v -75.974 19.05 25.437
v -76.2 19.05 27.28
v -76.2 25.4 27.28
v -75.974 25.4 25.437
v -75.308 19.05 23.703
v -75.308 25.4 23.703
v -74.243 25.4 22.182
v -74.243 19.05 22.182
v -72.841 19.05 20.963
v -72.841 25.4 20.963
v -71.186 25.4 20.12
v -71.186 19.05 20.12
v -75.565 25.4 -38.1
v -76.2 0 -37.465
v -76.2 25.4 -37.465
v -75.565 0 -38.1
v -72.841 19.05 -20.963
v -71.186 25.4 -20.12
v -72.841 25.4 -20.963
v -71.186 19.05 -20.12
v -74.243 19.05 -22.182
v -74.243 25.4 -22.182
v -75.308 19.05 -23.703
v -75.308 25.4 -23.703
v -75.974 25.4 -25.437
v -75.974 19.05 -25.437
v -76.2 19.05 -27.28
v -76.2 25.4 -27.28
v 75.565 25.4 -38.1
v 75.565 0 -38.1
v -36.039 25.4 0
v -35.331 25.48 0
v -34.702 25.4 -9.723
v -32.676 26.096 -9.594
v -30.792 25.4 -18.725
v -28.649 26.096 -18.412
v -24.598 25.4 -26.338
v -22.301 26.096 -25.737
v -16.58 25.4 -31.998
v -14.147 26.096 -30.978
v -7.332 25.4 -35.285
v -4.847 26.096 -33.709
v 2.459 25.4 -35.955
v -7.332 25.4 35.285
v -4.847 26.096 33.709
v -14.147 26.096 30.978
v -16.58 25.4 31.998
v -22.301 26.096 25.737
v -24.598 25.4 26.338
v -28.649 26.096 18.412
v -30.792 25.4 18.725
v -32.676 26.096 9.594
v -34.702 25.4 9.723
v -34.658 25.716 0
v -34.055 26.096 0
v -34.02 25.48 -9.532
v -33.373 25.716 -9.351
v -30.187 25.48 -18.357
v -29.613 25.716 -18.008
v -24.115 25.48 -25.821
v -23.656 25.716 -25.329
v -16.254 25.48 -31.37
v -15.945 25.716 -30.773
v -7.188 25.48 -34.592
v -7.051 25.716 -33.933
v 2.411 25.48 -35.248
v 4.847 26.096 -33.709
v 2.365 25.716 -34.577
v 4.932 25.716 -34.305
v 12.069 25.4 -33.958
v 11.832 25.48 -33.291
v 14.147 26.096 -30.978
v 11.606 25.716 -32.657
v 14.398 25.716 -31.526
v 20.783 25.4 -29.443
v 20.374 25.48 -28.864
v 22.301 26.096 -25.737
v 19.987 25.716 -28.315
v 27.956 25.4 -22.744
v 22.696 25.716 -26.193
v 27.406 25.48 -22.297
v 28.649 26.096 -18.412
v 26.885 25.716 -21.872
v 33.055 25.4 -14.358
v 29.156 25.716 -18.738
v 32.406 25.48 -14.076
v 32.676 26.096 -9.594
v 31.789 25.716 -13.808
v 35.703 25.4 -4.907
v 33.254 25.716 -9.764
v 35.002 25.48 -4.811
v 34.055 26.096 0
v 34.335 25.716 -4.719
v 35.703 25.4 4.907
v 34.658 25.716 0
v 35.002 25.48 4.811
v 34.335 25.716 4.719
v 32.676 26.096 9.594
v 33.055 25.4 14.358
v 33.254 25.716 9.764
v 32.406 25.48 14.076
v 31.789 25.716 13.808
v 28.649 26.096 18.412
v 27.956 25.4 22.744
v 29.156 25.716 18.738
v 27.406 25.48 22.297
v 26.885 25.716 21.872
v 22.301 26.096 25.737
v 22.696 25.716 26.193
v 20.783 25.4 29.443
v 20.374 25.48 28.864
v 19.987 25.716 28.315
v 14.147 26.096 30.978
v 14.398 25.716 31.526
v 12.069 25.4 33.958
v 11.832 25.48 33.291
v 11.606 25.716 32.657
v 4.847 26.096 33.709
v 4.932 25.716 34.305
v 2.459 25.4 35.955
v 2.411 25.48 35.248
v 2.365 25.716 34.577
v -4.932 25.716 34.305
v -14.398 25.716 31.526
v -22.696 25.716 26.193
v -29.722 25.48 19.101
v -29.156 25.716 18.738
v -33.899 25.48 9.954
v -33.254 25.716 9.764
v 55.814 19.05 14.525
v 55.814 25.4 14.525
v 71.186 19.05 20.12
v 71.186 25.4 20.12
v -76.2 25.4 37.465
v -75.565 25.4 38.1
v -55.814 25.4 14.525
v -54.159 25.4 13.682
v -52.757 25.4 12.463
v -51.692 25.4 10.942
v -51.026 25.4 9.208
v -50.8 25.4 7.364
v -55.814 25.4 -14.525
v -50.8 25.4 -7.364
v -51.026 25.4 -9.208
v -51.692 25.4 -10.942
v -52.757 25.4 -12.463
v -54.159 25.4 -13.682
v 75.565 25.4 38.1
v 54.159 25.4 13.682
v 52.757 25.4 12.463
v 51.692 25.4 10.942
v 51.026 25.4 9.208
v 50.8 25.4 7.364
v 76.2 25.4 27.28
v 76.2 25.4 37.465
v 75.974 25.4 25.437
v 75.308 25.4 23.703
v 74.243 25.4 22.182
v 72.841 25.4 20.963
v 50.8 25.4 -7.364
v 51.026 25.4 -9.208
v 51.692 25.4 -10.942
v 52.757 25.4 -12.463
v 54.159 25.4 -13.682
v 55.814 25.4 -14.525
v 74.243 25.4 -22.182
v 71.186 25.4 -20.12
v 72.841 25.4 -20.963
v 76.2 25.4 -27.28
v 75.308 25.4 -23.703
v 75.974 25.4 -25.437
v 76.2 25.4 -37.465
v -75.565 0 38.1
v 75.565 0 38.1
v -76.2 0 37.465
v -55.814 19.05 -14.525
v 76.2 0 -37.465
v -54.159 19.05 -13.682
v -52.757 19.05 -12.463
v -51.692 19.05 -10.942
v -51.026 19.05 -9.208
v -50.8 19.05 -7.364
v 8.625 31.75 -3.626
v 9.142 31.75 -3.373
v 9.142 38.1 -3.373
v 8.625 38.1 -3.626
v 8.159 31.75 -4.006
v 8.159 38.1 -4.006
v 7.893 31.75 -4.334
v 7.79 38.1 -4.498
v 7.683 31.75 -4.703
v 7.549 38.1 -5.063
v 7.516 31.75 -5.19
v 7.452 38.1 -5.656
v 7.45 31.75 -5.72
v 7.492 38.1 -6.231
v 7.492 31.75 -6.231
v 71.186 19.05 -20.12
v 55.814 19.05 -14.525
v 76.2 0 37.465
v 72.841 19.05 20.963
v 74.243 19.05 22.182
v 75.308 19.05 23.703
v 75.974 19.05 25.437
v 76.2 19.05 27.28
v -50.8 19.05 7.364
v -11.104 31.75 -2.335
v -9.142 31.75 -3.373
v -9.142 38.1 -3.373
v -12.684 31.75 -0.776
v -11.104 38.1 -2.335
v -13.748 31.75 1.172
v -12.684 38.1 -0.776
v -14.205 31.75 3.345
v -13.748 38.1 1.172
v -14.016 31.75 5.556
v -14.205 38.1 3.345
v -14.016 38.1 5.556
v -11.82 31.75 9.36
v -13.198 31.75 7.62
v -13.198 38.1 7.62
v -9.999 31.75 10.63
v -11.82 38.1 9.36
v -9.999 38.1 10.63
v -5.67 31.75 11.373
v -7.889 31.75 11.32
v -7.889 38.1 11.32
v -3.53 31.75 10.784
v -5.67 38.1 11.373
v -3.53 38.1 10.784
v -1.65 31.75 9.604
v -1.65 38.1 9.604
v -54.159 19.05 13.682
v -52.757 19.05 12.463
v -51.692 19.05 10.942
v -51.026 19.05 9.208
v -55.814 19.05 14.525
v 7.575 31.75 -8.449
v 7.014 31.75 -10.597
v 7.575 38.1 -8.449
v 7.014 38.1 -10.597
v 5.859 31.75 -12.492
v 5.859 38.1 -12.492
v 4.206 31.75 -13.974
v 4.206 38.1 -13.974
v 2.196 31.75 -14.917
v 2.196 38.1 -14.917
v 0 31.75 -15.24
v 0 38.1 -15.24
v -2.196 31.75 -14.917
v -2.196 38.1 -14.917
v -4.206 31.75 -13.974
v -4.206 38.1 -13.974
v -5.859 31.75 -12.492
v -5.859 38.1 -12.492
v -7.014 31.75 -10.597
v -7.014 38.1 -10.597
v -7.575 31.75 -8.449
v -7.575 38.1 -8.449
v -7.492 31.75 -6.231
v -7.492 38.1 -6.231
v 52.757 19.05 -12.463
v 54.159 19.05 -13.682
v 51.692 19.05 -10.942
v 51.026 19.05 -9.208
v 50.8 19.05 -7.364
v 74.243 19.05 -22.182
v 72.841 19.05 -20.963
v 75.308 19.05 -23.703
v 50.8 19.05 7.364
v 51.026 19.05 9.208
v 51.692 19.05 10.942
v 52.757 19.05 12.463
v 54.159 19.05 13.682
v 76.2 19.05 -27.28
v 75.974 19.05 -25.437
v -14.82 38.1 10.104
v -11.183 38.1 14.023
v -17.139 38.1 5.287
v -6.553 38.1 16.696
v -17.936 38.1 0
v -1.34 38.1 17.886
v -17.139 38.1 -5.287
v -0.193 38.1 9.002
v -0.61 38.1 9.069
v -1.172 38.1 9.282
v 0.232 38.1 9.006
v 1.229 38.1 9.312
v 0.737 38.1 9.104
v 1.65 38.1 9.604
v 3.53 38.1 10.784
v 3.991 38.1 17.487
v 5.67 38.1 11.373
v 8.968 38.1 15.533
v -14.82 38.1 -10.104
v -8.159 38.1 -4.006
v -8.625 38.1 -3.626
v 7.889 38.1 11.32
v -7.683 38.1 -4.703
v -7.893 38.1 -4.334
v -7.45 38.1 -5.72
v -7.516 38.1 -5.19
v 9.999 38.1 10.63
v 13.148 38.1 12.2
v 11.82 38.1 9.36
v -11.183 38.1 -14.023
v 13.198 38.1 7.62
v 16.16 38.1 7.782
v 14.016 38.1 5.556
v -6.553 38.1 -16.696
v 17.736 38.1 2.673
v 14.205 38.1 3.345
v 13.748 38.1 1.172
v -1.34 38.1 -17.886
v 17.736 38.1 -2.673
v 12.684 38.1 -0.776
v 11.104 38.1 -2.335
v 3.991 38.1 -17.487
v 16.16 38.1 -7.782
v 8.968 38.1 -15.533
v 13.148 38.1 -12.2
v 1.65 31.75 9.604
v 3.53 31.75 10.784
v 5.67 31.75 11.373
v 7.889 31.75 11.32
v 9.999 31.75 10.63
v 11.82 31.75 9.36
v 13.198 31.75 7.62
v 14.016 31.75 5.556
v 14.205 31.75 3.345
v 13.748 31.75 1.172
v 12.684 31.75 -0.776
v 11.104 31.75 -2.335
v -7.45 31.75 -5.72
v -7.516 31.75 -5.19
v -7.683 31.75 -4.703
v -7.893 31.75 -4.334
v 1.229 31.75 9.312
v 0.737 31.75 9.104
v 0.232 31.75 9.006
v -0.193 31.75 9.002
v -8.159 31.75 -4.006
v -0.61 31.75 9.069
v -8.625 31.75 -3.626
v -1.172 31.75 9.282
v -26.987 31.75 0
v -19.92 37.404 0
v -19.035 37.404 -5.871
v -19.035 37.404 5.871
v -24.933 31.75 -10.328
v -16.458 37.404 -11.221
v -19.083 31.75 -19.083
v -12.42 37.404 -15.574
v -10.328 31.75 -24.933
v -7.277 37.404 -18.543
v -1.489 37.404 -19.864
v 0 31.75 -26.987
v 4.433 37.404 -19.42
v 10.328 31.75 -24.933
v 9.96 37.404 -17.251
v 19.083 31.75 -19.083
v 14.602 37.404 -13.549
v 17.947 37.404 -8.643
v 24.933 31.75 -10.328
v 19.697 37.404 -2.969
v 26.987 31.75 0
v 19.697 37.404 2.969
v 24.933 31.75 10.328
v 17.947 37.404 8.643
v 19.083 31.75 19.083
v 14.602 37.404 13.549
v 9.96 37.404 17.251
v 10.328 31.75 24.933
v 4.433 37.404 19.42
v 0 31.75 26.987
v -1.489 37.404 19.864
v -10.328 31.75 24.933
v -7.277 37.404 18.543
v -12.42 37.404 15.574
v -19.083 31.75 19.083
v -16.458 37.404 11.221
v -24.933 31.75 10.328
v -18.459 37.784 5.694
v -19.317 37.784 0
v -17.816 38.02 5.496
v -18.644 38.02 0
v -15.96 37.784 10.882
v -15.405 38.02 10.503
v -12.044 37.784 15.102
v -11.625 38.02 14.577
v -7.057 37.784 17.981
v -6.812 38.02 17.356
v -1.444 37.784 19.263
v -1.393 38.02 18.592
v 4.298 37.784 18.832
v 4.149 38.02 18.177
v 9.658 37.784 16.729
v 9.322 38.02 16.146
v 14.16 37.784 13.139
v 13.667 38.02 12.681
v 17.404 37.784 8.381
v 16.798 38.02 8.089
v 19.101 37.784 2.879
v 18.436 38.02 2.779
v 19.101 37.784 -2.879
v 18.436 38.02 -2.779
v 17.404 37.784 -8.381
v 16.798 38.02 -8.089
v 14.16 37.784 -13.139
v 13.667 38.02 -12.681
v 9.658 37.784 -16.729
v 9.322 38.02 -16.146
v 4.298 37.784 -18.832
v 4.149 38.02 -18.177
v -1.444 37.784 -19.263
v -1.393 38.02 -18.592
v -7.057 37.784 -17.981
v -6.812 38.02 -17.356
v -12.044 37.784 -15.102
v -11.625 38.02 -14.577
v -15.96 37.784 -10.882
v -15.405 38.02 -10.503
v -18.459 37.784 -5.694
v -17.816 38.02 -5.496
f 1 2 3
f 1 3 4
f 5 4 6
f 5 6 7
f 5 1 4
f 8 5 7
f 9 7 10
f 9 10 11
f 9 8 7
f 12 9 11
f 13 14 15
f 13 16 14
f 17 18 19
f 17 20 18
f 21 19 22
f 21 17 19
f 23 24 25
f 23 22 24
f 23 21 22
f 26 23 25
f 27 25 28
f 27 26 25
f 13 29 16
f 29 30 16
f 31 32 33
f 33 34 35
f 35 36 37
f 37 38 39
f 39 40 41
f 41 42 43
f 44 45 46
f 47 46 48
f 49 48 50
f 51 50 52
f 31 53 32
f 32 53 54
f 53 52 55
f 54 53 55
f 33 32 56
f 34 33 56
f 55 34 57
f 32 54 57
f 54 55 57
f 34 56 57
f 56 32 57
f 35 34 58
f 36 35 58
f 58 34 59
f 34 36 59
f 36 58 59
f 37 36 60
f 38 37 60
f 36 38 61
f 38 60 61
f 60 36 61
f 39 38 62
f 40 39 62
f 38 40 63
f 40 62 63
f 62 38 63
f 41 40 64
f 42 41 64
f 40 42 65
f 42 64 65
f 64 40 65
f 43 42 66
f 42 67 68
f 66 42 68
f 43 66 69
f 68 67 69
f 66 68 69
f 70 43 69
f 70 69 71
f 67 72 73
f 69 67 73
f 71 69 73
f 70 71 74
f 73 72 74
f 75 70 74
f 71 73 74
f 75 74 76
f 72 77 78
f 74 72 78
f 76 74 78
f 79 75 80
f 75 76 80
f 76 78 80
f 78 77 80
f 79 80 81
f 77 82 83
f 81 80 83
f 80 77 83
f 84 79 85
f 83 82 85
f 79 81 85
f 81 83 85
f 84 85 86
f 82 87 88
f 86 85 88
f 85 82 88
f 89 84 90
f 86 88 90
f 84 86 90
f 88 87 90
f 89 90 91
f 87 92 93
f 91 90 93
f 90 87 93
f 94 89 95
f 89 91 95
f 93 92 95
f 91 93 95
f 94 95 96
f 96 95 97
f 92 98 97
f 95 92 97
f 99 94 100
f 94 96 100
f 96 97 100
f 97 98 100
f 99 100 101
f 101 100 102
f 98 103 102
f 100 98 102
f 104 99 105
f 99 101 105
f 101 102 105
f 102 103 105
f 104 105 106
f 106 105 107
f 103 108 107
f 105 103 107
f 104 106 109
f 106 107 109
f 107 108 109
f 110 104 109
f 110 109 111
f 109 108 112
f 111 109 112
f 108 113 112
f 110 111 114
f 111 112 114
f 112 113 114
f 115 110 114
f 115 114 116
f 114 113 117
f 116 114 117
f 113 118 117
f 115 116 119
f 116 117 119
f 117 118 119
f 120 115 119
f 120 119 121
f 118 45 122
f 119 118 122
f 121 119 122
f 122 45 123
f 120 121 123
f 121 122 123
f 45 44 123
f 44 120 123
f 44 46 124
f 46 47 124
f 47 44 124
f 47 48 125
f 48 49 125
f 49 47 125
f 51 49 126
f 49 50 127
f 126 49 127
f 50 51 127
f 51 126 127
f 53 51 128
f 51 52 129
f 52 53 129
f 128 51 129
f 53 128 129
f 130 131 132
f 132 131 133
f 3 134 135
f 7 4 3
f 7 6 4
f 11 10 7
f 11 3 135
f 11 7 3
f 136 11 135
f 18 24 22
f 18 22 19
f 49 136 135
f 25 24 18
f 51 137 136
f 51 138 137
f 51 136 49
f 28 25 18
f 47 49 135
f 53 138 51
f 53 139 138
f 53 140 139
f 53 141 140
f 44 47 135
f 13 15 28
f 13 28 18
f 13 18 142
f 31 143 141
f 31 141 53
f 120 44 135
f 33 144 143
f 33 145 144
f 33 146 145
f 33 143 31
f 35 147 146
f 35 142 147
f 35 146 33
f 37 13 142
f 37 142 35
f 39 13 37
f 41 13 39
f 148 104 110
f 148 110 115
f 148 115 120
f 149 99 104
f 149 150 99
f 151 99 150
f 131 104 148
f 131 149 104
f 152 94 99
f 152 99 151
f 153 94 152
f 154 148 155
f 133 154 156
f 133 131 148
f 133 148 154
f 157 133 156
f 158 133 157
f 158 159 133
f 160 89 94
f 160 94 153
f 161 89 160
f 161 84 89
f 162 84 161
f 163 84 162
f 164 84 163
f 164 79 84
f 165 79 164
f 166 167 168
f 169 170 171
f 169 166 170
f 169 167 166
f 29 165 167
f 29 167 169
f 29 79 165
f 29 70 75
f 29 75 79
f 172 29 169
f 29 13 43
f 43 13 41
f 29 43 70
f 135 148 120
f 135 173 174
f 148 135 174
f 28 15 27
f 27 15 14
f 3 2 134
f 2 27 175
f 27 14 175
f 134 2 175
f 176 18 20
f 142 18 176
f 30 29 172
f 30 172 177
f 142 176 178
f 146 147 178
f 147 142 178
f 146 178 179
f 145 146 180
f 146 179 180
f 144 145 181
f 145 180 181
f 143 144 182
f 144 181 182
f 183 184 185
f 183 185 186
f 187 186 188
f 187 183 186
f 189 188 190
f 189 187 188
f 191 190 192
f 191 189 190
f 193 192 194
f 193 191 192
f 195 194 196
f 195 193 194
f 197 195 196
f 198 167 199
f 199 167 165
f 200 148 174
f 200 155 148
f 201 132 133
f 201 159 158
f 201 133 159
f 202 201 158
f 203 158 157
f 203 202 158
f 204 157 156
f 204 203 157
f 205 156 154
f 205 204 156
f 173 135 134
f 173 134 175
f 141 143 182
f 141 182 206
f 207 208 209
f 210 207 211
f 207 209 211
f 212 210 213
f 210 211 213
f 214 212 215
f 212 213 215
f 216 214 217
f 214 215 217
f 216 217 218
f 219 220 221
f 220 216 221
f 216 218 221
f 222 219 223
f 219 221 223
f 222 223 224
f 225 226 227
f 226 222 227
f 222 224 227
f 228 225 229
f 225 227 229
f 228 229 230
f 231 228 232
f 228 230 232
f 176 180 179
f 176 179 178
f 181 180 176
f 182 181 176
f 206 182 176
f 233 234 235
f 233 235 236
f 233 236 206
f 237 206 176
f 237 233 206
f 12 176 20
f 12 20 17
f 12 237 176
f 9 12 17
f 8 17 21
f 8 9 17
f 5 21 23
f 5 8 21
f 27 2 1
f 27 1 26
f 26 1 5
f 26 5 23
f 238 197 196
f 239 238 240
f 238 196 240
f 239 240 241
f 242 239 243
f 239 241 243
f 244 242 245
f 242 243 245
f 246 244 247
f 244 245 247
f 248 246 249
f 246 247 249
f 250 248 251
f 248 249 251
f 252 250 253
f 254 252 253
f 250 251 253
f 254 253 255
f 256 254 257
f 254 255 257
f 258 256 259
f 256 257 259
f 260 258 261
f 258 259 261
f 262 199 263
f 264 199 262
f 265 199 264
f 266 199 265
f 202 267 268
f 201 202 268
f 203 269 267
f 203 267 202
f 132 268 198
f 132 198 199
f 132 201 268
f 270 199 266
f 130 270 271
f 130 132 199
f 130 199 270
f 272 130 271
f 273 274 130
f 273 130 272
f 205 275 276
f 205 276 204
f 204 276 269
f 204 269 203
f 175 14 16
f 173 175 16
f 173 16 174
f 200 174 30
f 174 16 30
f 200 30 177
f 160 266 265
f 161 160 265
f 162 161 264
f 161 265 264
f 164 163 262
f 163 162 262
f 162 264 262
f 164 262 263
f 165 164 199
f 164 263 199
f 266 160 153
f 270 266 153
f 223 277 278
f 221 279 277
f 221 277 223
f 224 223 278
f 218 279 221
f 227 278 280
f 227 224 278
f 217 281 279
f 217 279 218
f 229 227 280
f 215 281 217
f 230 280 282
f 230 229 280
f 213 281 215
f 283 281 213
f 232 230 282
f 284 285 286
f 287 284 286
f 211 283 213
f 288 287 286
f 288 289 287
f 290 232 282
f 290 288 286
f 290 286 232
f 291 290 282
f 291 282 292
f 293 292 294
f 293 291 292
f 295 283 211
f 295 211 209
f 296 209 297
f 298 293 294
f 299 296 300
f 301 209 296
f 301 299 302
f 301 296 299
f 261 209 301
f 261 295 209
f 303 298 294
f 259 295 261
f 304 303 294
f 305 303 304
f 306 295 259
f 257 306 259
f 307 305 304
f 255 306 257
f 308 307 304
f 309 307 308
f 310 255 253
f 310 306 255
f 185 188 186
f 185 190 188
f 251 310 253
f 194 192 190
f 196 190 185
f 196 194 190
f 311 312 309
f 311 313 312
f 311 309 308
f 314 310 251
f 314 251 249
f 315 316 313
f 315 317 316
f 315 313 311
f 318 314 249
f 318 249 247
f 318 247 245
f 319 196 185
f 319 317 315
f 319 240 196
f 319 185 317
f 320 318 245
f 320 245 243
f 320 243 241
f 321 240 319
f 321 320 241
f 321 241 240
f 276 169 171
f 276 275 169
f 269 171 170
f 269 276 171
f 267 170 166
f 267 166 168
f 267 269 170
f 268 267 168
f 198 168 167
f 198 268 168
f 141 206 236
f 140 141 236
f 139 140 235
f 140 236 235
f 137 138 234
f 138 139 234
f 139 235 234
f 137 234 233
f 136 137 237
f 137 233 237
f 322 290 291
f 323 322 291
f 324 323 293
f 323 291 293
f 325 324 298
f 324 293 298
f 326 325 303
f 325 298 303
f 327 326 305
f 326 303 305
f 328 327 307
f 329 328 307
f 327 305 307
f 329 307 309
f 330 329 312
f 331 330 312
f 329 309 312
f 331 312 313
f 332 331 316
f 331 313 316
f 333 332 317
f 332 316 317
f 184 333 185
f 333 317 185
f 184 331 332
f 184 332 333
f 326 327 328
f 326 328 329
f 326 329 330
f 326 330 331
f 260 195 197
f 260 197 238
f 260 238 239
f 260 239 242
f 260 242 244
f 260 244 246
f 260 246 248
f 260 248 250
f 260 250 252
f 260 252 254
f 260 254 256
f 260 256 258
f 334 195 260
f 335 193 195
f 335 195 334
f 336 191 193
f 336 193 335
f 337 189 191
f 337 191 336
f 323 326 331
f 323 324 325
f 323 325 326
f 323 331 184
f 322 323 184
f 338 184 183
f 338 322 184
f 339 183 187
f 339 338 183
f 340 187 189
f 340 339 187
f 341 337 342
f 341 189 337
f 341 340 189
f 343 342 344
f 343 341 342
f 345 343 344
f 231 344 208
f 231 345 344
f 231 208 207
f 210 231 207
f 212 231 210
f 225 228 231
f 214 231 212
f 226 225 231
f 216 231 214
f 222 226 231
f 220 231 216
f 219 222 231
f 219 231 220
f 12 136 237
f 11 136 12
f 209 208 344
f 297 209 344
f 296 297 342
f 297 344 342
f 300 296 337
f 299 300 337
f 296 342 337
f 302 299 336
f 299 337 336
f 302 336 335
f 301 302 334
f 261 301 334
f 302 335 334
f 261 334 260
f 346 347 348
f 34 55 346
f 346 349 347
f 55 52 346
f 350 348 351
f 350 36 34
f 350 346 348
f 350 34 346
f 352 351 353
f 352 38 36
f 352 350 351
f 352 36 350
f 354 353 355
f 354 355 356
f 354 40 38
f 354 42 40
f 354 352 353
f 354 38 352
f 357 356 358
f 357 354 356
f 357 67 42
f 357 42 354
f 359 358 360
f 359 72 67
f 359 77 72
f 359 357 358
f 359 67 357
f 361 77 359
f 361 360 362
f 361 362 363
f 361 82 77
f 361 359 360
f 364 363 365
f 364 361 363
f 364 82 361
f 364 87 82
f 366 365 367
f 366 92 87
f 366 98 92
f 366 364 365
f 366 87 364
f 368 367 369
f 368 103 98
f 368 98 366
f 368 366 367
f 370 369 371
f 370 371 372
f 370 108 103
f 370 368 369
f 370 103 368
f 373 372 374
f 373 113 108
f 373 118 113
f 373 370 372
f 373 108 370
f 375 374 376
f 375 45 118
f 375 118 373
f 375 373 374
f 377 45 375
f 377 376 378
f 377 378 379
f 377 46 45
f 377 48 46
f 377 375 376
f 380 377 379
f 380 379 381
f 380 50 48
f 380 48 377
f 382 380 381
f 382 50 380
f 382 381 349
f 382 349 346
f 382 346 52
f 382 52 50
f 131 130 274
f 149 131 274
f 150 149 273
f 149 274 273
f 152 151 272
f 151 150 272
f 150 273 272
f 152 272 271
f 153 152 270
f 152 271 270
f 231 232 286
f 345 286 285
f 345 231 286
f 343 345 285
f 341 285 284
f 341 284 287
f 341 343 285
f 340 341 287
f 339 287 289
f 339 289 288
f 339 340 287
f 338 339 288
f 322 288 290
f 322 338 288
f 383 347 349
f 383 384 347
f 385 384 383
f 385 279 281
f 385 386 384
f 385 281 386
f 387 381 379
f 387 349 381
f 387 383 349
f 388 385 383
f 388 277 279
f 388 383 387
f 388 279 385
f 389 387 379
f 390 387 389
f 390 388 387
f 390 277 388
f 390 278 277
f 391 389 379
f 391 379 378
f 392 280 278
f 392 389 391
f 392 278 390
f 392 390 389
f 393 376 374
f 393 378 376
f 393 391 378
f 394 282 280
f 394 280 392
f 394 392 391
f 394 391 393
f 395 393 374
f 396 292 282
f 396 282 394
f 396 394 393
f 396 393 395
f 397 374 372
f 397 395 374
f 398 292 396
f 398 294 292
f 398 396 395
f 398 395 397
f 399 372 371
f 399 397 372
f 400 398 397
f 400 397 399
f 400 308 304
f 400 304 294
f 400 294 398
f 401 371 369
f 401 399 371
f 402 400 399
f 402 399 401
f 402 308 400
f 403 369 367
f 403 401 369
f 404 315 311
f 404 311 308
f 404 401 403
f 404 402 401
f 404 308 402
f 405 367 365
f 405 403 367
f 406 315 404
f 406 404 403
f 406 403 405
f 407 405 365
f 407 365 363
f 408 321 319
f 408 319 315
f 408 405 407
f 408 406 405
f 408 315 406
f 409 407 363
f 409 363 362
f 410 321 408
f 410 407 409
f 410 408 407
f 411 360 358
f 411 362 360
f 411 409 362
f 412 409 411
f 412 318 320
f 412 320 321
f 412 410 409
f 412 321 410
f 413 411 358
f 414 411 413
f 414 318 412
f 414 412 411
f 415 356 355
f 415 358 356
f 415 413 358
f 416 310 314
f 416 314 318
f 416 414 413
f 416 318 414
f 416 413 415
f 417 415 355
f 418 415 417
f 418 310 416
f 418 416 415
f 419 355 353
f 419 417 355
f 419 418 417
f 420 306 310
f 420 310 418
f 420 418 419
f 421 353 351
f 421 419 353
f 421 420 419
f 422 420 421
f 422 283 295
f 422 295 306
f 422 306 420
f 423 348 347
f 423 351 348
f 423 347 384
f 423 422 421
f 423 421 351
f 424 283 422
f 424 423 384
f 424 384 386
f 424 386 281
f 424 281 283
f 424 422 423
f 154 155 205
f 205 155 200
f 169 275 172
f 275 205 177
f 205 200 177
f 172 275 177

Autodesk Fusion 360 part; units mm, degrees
sketch "Sketch1" plane through (0, 0, 0) normal (0, 1, 0) x (1, 0, 0)
  line L0 (76.2, 38.1) -> (-76.2, 38.1)
  line L1 (-76.2, 38.1) -> (-76.2, -38.1)
  line L2 (-76.2, -38.1) -> (76.2, -38.1)
  line L3 (76.2, -38.1) -> (76.2, 38.1)
  line L4 (76.2, 38.1) -> (-76.2, -38.1) construction
  line L5 (-76.2, 38.1) -> (76.2, -38.1) construction
  dimension "d1" = 76.2
  dimension "d2" = 152.4
extrude "Extrude1" add sketch "Sketch1" along normal blind 25.4
ref_plane "WorkPlane1" through (0, 38.1, 0) normal (0, 1, 0) x (0, 0, 1)
sketch "Sketch3" plane through (0, 38.1, 0) normal (0, 1, 0) x (1, 0, 0)
  circle A0 centre (0, 0) radius 19.05
  dimension "d6" = 38.1
sketch "Sketch4" plane through (0, 25.4, 0) normal (0, 1, 0) x (-1, 0, 0)
  line L0 (-76.2, 38.1) -> (-76.2, -38.1)
  line L1 (-76.2, -38.1) -> (76.2, -38.1)
  line L2 (76.2, -38.1) -> (76.2, 38.1)
  line L3 (76.2, 38.1) -> (-76.2, 38.1)
  circle A0 centre (0, 0) radius 34.925
  dimension "d7" = 69.85
loft "Loft1" add profiles "Sketch4", "Sketch3" section 1 contours A0 section 2
fillet "Fillet1" radius 3.175 2 edges at (-17.7608, 38.1, -6.8888) (32.5615, 25.4, 12.6294)
sketch "Sketch5" plane through (0, 25.4, 0) normal (0, 1, 0) x (-1, 0, 0)
  line L0 (-76.2, 38.1) -> (-76.2, -38.1)
  line L1 (-76.2, -38.1) -> (76.2, -38.1)
  line L2 (76.2, -38.1) -> (76.2, 38.1)
  line L3 (76.2, 38.1) -> (-76.2, 38.1)
  circle A0 centre (0, 0) radius 36.0387
  line L4 (76.2, 0) -> (-76.2, 0) construction
  line L5 (-76.2, -21.9448) -> (-50.8, -12.7)
  line L6 (-50.8, -12.7) -> (-50.8, 12.7)
  line L7 (-50.8, 12.7) -> (-76.2, 21.9448)
  line L8 (0, 0) -> (0, -47.7527) construction
  line L9 (50.8, 12.7) -> (76.2, 21.9448)
  line L10 (50.8, -12.7) -> (50.8, 12.7)
  line L11 (76.2, -21.9448) -> (50.8, -12.7)
  dimension "d10" = 25.4
  dimension "d11" = 25.4
  dimension "d12" = 70
extrude "Extrude2" cut sketch "Sketch5" against normal blind 6.35 contours L0 L5 L6 L7 | L2 L9 L10 L11
fillet "Fillet2" radius 7.62 8 edges at (76.2, 22.225, -21.9448) (76.2, 22.225, 21.9448) (50.8, 22.225, -12.7) (50.8, 22.225, 12.7) (-50.8, 22.225, 12.7) (-50.8, 22.225, -12.7) (-76.2, 22.225, -21.9448) (-76.2, 22.225, 21.9448)
sketch "Sketch6" plane through (0, 38.1, 0) normal (0, 1, 0) x (-1, 0, 0)
  circle A0 centre (0, 0) radius 17.9363
  circle A1 centre (0, -7.62) radius 7.62
  circle A2 centre (6.5991, 3.81) radius 7.62
  circle A3 centre (-6.5991, 3.81) radius 7.62
  dimension "d16" = 15.24
  dimension "d17" = 7.62
  dimension "d19" = 360
extrude "Extrude3" cut sketch "Sketch6" against normal blind 6.35 contours A1 A2 A3 | A1 A2 | A1 A2 A3 | A1 A2 A3 | A1 A3 | A2 A3
fillet "Fillet3" radius 2.54 3 edges at (-6.5991, 34.925, -3.81) (6.5991, 34.925, -3.81) (0, 34.925, 7.62)
chamfer "Chamfer2" distance 0.635 angle 45 4 edges at (76.2, 12.7, 38.1) (-76.2, 12.7, 38.1) (-76.2, 12.7, -38.1) (76.2, 12.7, -38.1)
